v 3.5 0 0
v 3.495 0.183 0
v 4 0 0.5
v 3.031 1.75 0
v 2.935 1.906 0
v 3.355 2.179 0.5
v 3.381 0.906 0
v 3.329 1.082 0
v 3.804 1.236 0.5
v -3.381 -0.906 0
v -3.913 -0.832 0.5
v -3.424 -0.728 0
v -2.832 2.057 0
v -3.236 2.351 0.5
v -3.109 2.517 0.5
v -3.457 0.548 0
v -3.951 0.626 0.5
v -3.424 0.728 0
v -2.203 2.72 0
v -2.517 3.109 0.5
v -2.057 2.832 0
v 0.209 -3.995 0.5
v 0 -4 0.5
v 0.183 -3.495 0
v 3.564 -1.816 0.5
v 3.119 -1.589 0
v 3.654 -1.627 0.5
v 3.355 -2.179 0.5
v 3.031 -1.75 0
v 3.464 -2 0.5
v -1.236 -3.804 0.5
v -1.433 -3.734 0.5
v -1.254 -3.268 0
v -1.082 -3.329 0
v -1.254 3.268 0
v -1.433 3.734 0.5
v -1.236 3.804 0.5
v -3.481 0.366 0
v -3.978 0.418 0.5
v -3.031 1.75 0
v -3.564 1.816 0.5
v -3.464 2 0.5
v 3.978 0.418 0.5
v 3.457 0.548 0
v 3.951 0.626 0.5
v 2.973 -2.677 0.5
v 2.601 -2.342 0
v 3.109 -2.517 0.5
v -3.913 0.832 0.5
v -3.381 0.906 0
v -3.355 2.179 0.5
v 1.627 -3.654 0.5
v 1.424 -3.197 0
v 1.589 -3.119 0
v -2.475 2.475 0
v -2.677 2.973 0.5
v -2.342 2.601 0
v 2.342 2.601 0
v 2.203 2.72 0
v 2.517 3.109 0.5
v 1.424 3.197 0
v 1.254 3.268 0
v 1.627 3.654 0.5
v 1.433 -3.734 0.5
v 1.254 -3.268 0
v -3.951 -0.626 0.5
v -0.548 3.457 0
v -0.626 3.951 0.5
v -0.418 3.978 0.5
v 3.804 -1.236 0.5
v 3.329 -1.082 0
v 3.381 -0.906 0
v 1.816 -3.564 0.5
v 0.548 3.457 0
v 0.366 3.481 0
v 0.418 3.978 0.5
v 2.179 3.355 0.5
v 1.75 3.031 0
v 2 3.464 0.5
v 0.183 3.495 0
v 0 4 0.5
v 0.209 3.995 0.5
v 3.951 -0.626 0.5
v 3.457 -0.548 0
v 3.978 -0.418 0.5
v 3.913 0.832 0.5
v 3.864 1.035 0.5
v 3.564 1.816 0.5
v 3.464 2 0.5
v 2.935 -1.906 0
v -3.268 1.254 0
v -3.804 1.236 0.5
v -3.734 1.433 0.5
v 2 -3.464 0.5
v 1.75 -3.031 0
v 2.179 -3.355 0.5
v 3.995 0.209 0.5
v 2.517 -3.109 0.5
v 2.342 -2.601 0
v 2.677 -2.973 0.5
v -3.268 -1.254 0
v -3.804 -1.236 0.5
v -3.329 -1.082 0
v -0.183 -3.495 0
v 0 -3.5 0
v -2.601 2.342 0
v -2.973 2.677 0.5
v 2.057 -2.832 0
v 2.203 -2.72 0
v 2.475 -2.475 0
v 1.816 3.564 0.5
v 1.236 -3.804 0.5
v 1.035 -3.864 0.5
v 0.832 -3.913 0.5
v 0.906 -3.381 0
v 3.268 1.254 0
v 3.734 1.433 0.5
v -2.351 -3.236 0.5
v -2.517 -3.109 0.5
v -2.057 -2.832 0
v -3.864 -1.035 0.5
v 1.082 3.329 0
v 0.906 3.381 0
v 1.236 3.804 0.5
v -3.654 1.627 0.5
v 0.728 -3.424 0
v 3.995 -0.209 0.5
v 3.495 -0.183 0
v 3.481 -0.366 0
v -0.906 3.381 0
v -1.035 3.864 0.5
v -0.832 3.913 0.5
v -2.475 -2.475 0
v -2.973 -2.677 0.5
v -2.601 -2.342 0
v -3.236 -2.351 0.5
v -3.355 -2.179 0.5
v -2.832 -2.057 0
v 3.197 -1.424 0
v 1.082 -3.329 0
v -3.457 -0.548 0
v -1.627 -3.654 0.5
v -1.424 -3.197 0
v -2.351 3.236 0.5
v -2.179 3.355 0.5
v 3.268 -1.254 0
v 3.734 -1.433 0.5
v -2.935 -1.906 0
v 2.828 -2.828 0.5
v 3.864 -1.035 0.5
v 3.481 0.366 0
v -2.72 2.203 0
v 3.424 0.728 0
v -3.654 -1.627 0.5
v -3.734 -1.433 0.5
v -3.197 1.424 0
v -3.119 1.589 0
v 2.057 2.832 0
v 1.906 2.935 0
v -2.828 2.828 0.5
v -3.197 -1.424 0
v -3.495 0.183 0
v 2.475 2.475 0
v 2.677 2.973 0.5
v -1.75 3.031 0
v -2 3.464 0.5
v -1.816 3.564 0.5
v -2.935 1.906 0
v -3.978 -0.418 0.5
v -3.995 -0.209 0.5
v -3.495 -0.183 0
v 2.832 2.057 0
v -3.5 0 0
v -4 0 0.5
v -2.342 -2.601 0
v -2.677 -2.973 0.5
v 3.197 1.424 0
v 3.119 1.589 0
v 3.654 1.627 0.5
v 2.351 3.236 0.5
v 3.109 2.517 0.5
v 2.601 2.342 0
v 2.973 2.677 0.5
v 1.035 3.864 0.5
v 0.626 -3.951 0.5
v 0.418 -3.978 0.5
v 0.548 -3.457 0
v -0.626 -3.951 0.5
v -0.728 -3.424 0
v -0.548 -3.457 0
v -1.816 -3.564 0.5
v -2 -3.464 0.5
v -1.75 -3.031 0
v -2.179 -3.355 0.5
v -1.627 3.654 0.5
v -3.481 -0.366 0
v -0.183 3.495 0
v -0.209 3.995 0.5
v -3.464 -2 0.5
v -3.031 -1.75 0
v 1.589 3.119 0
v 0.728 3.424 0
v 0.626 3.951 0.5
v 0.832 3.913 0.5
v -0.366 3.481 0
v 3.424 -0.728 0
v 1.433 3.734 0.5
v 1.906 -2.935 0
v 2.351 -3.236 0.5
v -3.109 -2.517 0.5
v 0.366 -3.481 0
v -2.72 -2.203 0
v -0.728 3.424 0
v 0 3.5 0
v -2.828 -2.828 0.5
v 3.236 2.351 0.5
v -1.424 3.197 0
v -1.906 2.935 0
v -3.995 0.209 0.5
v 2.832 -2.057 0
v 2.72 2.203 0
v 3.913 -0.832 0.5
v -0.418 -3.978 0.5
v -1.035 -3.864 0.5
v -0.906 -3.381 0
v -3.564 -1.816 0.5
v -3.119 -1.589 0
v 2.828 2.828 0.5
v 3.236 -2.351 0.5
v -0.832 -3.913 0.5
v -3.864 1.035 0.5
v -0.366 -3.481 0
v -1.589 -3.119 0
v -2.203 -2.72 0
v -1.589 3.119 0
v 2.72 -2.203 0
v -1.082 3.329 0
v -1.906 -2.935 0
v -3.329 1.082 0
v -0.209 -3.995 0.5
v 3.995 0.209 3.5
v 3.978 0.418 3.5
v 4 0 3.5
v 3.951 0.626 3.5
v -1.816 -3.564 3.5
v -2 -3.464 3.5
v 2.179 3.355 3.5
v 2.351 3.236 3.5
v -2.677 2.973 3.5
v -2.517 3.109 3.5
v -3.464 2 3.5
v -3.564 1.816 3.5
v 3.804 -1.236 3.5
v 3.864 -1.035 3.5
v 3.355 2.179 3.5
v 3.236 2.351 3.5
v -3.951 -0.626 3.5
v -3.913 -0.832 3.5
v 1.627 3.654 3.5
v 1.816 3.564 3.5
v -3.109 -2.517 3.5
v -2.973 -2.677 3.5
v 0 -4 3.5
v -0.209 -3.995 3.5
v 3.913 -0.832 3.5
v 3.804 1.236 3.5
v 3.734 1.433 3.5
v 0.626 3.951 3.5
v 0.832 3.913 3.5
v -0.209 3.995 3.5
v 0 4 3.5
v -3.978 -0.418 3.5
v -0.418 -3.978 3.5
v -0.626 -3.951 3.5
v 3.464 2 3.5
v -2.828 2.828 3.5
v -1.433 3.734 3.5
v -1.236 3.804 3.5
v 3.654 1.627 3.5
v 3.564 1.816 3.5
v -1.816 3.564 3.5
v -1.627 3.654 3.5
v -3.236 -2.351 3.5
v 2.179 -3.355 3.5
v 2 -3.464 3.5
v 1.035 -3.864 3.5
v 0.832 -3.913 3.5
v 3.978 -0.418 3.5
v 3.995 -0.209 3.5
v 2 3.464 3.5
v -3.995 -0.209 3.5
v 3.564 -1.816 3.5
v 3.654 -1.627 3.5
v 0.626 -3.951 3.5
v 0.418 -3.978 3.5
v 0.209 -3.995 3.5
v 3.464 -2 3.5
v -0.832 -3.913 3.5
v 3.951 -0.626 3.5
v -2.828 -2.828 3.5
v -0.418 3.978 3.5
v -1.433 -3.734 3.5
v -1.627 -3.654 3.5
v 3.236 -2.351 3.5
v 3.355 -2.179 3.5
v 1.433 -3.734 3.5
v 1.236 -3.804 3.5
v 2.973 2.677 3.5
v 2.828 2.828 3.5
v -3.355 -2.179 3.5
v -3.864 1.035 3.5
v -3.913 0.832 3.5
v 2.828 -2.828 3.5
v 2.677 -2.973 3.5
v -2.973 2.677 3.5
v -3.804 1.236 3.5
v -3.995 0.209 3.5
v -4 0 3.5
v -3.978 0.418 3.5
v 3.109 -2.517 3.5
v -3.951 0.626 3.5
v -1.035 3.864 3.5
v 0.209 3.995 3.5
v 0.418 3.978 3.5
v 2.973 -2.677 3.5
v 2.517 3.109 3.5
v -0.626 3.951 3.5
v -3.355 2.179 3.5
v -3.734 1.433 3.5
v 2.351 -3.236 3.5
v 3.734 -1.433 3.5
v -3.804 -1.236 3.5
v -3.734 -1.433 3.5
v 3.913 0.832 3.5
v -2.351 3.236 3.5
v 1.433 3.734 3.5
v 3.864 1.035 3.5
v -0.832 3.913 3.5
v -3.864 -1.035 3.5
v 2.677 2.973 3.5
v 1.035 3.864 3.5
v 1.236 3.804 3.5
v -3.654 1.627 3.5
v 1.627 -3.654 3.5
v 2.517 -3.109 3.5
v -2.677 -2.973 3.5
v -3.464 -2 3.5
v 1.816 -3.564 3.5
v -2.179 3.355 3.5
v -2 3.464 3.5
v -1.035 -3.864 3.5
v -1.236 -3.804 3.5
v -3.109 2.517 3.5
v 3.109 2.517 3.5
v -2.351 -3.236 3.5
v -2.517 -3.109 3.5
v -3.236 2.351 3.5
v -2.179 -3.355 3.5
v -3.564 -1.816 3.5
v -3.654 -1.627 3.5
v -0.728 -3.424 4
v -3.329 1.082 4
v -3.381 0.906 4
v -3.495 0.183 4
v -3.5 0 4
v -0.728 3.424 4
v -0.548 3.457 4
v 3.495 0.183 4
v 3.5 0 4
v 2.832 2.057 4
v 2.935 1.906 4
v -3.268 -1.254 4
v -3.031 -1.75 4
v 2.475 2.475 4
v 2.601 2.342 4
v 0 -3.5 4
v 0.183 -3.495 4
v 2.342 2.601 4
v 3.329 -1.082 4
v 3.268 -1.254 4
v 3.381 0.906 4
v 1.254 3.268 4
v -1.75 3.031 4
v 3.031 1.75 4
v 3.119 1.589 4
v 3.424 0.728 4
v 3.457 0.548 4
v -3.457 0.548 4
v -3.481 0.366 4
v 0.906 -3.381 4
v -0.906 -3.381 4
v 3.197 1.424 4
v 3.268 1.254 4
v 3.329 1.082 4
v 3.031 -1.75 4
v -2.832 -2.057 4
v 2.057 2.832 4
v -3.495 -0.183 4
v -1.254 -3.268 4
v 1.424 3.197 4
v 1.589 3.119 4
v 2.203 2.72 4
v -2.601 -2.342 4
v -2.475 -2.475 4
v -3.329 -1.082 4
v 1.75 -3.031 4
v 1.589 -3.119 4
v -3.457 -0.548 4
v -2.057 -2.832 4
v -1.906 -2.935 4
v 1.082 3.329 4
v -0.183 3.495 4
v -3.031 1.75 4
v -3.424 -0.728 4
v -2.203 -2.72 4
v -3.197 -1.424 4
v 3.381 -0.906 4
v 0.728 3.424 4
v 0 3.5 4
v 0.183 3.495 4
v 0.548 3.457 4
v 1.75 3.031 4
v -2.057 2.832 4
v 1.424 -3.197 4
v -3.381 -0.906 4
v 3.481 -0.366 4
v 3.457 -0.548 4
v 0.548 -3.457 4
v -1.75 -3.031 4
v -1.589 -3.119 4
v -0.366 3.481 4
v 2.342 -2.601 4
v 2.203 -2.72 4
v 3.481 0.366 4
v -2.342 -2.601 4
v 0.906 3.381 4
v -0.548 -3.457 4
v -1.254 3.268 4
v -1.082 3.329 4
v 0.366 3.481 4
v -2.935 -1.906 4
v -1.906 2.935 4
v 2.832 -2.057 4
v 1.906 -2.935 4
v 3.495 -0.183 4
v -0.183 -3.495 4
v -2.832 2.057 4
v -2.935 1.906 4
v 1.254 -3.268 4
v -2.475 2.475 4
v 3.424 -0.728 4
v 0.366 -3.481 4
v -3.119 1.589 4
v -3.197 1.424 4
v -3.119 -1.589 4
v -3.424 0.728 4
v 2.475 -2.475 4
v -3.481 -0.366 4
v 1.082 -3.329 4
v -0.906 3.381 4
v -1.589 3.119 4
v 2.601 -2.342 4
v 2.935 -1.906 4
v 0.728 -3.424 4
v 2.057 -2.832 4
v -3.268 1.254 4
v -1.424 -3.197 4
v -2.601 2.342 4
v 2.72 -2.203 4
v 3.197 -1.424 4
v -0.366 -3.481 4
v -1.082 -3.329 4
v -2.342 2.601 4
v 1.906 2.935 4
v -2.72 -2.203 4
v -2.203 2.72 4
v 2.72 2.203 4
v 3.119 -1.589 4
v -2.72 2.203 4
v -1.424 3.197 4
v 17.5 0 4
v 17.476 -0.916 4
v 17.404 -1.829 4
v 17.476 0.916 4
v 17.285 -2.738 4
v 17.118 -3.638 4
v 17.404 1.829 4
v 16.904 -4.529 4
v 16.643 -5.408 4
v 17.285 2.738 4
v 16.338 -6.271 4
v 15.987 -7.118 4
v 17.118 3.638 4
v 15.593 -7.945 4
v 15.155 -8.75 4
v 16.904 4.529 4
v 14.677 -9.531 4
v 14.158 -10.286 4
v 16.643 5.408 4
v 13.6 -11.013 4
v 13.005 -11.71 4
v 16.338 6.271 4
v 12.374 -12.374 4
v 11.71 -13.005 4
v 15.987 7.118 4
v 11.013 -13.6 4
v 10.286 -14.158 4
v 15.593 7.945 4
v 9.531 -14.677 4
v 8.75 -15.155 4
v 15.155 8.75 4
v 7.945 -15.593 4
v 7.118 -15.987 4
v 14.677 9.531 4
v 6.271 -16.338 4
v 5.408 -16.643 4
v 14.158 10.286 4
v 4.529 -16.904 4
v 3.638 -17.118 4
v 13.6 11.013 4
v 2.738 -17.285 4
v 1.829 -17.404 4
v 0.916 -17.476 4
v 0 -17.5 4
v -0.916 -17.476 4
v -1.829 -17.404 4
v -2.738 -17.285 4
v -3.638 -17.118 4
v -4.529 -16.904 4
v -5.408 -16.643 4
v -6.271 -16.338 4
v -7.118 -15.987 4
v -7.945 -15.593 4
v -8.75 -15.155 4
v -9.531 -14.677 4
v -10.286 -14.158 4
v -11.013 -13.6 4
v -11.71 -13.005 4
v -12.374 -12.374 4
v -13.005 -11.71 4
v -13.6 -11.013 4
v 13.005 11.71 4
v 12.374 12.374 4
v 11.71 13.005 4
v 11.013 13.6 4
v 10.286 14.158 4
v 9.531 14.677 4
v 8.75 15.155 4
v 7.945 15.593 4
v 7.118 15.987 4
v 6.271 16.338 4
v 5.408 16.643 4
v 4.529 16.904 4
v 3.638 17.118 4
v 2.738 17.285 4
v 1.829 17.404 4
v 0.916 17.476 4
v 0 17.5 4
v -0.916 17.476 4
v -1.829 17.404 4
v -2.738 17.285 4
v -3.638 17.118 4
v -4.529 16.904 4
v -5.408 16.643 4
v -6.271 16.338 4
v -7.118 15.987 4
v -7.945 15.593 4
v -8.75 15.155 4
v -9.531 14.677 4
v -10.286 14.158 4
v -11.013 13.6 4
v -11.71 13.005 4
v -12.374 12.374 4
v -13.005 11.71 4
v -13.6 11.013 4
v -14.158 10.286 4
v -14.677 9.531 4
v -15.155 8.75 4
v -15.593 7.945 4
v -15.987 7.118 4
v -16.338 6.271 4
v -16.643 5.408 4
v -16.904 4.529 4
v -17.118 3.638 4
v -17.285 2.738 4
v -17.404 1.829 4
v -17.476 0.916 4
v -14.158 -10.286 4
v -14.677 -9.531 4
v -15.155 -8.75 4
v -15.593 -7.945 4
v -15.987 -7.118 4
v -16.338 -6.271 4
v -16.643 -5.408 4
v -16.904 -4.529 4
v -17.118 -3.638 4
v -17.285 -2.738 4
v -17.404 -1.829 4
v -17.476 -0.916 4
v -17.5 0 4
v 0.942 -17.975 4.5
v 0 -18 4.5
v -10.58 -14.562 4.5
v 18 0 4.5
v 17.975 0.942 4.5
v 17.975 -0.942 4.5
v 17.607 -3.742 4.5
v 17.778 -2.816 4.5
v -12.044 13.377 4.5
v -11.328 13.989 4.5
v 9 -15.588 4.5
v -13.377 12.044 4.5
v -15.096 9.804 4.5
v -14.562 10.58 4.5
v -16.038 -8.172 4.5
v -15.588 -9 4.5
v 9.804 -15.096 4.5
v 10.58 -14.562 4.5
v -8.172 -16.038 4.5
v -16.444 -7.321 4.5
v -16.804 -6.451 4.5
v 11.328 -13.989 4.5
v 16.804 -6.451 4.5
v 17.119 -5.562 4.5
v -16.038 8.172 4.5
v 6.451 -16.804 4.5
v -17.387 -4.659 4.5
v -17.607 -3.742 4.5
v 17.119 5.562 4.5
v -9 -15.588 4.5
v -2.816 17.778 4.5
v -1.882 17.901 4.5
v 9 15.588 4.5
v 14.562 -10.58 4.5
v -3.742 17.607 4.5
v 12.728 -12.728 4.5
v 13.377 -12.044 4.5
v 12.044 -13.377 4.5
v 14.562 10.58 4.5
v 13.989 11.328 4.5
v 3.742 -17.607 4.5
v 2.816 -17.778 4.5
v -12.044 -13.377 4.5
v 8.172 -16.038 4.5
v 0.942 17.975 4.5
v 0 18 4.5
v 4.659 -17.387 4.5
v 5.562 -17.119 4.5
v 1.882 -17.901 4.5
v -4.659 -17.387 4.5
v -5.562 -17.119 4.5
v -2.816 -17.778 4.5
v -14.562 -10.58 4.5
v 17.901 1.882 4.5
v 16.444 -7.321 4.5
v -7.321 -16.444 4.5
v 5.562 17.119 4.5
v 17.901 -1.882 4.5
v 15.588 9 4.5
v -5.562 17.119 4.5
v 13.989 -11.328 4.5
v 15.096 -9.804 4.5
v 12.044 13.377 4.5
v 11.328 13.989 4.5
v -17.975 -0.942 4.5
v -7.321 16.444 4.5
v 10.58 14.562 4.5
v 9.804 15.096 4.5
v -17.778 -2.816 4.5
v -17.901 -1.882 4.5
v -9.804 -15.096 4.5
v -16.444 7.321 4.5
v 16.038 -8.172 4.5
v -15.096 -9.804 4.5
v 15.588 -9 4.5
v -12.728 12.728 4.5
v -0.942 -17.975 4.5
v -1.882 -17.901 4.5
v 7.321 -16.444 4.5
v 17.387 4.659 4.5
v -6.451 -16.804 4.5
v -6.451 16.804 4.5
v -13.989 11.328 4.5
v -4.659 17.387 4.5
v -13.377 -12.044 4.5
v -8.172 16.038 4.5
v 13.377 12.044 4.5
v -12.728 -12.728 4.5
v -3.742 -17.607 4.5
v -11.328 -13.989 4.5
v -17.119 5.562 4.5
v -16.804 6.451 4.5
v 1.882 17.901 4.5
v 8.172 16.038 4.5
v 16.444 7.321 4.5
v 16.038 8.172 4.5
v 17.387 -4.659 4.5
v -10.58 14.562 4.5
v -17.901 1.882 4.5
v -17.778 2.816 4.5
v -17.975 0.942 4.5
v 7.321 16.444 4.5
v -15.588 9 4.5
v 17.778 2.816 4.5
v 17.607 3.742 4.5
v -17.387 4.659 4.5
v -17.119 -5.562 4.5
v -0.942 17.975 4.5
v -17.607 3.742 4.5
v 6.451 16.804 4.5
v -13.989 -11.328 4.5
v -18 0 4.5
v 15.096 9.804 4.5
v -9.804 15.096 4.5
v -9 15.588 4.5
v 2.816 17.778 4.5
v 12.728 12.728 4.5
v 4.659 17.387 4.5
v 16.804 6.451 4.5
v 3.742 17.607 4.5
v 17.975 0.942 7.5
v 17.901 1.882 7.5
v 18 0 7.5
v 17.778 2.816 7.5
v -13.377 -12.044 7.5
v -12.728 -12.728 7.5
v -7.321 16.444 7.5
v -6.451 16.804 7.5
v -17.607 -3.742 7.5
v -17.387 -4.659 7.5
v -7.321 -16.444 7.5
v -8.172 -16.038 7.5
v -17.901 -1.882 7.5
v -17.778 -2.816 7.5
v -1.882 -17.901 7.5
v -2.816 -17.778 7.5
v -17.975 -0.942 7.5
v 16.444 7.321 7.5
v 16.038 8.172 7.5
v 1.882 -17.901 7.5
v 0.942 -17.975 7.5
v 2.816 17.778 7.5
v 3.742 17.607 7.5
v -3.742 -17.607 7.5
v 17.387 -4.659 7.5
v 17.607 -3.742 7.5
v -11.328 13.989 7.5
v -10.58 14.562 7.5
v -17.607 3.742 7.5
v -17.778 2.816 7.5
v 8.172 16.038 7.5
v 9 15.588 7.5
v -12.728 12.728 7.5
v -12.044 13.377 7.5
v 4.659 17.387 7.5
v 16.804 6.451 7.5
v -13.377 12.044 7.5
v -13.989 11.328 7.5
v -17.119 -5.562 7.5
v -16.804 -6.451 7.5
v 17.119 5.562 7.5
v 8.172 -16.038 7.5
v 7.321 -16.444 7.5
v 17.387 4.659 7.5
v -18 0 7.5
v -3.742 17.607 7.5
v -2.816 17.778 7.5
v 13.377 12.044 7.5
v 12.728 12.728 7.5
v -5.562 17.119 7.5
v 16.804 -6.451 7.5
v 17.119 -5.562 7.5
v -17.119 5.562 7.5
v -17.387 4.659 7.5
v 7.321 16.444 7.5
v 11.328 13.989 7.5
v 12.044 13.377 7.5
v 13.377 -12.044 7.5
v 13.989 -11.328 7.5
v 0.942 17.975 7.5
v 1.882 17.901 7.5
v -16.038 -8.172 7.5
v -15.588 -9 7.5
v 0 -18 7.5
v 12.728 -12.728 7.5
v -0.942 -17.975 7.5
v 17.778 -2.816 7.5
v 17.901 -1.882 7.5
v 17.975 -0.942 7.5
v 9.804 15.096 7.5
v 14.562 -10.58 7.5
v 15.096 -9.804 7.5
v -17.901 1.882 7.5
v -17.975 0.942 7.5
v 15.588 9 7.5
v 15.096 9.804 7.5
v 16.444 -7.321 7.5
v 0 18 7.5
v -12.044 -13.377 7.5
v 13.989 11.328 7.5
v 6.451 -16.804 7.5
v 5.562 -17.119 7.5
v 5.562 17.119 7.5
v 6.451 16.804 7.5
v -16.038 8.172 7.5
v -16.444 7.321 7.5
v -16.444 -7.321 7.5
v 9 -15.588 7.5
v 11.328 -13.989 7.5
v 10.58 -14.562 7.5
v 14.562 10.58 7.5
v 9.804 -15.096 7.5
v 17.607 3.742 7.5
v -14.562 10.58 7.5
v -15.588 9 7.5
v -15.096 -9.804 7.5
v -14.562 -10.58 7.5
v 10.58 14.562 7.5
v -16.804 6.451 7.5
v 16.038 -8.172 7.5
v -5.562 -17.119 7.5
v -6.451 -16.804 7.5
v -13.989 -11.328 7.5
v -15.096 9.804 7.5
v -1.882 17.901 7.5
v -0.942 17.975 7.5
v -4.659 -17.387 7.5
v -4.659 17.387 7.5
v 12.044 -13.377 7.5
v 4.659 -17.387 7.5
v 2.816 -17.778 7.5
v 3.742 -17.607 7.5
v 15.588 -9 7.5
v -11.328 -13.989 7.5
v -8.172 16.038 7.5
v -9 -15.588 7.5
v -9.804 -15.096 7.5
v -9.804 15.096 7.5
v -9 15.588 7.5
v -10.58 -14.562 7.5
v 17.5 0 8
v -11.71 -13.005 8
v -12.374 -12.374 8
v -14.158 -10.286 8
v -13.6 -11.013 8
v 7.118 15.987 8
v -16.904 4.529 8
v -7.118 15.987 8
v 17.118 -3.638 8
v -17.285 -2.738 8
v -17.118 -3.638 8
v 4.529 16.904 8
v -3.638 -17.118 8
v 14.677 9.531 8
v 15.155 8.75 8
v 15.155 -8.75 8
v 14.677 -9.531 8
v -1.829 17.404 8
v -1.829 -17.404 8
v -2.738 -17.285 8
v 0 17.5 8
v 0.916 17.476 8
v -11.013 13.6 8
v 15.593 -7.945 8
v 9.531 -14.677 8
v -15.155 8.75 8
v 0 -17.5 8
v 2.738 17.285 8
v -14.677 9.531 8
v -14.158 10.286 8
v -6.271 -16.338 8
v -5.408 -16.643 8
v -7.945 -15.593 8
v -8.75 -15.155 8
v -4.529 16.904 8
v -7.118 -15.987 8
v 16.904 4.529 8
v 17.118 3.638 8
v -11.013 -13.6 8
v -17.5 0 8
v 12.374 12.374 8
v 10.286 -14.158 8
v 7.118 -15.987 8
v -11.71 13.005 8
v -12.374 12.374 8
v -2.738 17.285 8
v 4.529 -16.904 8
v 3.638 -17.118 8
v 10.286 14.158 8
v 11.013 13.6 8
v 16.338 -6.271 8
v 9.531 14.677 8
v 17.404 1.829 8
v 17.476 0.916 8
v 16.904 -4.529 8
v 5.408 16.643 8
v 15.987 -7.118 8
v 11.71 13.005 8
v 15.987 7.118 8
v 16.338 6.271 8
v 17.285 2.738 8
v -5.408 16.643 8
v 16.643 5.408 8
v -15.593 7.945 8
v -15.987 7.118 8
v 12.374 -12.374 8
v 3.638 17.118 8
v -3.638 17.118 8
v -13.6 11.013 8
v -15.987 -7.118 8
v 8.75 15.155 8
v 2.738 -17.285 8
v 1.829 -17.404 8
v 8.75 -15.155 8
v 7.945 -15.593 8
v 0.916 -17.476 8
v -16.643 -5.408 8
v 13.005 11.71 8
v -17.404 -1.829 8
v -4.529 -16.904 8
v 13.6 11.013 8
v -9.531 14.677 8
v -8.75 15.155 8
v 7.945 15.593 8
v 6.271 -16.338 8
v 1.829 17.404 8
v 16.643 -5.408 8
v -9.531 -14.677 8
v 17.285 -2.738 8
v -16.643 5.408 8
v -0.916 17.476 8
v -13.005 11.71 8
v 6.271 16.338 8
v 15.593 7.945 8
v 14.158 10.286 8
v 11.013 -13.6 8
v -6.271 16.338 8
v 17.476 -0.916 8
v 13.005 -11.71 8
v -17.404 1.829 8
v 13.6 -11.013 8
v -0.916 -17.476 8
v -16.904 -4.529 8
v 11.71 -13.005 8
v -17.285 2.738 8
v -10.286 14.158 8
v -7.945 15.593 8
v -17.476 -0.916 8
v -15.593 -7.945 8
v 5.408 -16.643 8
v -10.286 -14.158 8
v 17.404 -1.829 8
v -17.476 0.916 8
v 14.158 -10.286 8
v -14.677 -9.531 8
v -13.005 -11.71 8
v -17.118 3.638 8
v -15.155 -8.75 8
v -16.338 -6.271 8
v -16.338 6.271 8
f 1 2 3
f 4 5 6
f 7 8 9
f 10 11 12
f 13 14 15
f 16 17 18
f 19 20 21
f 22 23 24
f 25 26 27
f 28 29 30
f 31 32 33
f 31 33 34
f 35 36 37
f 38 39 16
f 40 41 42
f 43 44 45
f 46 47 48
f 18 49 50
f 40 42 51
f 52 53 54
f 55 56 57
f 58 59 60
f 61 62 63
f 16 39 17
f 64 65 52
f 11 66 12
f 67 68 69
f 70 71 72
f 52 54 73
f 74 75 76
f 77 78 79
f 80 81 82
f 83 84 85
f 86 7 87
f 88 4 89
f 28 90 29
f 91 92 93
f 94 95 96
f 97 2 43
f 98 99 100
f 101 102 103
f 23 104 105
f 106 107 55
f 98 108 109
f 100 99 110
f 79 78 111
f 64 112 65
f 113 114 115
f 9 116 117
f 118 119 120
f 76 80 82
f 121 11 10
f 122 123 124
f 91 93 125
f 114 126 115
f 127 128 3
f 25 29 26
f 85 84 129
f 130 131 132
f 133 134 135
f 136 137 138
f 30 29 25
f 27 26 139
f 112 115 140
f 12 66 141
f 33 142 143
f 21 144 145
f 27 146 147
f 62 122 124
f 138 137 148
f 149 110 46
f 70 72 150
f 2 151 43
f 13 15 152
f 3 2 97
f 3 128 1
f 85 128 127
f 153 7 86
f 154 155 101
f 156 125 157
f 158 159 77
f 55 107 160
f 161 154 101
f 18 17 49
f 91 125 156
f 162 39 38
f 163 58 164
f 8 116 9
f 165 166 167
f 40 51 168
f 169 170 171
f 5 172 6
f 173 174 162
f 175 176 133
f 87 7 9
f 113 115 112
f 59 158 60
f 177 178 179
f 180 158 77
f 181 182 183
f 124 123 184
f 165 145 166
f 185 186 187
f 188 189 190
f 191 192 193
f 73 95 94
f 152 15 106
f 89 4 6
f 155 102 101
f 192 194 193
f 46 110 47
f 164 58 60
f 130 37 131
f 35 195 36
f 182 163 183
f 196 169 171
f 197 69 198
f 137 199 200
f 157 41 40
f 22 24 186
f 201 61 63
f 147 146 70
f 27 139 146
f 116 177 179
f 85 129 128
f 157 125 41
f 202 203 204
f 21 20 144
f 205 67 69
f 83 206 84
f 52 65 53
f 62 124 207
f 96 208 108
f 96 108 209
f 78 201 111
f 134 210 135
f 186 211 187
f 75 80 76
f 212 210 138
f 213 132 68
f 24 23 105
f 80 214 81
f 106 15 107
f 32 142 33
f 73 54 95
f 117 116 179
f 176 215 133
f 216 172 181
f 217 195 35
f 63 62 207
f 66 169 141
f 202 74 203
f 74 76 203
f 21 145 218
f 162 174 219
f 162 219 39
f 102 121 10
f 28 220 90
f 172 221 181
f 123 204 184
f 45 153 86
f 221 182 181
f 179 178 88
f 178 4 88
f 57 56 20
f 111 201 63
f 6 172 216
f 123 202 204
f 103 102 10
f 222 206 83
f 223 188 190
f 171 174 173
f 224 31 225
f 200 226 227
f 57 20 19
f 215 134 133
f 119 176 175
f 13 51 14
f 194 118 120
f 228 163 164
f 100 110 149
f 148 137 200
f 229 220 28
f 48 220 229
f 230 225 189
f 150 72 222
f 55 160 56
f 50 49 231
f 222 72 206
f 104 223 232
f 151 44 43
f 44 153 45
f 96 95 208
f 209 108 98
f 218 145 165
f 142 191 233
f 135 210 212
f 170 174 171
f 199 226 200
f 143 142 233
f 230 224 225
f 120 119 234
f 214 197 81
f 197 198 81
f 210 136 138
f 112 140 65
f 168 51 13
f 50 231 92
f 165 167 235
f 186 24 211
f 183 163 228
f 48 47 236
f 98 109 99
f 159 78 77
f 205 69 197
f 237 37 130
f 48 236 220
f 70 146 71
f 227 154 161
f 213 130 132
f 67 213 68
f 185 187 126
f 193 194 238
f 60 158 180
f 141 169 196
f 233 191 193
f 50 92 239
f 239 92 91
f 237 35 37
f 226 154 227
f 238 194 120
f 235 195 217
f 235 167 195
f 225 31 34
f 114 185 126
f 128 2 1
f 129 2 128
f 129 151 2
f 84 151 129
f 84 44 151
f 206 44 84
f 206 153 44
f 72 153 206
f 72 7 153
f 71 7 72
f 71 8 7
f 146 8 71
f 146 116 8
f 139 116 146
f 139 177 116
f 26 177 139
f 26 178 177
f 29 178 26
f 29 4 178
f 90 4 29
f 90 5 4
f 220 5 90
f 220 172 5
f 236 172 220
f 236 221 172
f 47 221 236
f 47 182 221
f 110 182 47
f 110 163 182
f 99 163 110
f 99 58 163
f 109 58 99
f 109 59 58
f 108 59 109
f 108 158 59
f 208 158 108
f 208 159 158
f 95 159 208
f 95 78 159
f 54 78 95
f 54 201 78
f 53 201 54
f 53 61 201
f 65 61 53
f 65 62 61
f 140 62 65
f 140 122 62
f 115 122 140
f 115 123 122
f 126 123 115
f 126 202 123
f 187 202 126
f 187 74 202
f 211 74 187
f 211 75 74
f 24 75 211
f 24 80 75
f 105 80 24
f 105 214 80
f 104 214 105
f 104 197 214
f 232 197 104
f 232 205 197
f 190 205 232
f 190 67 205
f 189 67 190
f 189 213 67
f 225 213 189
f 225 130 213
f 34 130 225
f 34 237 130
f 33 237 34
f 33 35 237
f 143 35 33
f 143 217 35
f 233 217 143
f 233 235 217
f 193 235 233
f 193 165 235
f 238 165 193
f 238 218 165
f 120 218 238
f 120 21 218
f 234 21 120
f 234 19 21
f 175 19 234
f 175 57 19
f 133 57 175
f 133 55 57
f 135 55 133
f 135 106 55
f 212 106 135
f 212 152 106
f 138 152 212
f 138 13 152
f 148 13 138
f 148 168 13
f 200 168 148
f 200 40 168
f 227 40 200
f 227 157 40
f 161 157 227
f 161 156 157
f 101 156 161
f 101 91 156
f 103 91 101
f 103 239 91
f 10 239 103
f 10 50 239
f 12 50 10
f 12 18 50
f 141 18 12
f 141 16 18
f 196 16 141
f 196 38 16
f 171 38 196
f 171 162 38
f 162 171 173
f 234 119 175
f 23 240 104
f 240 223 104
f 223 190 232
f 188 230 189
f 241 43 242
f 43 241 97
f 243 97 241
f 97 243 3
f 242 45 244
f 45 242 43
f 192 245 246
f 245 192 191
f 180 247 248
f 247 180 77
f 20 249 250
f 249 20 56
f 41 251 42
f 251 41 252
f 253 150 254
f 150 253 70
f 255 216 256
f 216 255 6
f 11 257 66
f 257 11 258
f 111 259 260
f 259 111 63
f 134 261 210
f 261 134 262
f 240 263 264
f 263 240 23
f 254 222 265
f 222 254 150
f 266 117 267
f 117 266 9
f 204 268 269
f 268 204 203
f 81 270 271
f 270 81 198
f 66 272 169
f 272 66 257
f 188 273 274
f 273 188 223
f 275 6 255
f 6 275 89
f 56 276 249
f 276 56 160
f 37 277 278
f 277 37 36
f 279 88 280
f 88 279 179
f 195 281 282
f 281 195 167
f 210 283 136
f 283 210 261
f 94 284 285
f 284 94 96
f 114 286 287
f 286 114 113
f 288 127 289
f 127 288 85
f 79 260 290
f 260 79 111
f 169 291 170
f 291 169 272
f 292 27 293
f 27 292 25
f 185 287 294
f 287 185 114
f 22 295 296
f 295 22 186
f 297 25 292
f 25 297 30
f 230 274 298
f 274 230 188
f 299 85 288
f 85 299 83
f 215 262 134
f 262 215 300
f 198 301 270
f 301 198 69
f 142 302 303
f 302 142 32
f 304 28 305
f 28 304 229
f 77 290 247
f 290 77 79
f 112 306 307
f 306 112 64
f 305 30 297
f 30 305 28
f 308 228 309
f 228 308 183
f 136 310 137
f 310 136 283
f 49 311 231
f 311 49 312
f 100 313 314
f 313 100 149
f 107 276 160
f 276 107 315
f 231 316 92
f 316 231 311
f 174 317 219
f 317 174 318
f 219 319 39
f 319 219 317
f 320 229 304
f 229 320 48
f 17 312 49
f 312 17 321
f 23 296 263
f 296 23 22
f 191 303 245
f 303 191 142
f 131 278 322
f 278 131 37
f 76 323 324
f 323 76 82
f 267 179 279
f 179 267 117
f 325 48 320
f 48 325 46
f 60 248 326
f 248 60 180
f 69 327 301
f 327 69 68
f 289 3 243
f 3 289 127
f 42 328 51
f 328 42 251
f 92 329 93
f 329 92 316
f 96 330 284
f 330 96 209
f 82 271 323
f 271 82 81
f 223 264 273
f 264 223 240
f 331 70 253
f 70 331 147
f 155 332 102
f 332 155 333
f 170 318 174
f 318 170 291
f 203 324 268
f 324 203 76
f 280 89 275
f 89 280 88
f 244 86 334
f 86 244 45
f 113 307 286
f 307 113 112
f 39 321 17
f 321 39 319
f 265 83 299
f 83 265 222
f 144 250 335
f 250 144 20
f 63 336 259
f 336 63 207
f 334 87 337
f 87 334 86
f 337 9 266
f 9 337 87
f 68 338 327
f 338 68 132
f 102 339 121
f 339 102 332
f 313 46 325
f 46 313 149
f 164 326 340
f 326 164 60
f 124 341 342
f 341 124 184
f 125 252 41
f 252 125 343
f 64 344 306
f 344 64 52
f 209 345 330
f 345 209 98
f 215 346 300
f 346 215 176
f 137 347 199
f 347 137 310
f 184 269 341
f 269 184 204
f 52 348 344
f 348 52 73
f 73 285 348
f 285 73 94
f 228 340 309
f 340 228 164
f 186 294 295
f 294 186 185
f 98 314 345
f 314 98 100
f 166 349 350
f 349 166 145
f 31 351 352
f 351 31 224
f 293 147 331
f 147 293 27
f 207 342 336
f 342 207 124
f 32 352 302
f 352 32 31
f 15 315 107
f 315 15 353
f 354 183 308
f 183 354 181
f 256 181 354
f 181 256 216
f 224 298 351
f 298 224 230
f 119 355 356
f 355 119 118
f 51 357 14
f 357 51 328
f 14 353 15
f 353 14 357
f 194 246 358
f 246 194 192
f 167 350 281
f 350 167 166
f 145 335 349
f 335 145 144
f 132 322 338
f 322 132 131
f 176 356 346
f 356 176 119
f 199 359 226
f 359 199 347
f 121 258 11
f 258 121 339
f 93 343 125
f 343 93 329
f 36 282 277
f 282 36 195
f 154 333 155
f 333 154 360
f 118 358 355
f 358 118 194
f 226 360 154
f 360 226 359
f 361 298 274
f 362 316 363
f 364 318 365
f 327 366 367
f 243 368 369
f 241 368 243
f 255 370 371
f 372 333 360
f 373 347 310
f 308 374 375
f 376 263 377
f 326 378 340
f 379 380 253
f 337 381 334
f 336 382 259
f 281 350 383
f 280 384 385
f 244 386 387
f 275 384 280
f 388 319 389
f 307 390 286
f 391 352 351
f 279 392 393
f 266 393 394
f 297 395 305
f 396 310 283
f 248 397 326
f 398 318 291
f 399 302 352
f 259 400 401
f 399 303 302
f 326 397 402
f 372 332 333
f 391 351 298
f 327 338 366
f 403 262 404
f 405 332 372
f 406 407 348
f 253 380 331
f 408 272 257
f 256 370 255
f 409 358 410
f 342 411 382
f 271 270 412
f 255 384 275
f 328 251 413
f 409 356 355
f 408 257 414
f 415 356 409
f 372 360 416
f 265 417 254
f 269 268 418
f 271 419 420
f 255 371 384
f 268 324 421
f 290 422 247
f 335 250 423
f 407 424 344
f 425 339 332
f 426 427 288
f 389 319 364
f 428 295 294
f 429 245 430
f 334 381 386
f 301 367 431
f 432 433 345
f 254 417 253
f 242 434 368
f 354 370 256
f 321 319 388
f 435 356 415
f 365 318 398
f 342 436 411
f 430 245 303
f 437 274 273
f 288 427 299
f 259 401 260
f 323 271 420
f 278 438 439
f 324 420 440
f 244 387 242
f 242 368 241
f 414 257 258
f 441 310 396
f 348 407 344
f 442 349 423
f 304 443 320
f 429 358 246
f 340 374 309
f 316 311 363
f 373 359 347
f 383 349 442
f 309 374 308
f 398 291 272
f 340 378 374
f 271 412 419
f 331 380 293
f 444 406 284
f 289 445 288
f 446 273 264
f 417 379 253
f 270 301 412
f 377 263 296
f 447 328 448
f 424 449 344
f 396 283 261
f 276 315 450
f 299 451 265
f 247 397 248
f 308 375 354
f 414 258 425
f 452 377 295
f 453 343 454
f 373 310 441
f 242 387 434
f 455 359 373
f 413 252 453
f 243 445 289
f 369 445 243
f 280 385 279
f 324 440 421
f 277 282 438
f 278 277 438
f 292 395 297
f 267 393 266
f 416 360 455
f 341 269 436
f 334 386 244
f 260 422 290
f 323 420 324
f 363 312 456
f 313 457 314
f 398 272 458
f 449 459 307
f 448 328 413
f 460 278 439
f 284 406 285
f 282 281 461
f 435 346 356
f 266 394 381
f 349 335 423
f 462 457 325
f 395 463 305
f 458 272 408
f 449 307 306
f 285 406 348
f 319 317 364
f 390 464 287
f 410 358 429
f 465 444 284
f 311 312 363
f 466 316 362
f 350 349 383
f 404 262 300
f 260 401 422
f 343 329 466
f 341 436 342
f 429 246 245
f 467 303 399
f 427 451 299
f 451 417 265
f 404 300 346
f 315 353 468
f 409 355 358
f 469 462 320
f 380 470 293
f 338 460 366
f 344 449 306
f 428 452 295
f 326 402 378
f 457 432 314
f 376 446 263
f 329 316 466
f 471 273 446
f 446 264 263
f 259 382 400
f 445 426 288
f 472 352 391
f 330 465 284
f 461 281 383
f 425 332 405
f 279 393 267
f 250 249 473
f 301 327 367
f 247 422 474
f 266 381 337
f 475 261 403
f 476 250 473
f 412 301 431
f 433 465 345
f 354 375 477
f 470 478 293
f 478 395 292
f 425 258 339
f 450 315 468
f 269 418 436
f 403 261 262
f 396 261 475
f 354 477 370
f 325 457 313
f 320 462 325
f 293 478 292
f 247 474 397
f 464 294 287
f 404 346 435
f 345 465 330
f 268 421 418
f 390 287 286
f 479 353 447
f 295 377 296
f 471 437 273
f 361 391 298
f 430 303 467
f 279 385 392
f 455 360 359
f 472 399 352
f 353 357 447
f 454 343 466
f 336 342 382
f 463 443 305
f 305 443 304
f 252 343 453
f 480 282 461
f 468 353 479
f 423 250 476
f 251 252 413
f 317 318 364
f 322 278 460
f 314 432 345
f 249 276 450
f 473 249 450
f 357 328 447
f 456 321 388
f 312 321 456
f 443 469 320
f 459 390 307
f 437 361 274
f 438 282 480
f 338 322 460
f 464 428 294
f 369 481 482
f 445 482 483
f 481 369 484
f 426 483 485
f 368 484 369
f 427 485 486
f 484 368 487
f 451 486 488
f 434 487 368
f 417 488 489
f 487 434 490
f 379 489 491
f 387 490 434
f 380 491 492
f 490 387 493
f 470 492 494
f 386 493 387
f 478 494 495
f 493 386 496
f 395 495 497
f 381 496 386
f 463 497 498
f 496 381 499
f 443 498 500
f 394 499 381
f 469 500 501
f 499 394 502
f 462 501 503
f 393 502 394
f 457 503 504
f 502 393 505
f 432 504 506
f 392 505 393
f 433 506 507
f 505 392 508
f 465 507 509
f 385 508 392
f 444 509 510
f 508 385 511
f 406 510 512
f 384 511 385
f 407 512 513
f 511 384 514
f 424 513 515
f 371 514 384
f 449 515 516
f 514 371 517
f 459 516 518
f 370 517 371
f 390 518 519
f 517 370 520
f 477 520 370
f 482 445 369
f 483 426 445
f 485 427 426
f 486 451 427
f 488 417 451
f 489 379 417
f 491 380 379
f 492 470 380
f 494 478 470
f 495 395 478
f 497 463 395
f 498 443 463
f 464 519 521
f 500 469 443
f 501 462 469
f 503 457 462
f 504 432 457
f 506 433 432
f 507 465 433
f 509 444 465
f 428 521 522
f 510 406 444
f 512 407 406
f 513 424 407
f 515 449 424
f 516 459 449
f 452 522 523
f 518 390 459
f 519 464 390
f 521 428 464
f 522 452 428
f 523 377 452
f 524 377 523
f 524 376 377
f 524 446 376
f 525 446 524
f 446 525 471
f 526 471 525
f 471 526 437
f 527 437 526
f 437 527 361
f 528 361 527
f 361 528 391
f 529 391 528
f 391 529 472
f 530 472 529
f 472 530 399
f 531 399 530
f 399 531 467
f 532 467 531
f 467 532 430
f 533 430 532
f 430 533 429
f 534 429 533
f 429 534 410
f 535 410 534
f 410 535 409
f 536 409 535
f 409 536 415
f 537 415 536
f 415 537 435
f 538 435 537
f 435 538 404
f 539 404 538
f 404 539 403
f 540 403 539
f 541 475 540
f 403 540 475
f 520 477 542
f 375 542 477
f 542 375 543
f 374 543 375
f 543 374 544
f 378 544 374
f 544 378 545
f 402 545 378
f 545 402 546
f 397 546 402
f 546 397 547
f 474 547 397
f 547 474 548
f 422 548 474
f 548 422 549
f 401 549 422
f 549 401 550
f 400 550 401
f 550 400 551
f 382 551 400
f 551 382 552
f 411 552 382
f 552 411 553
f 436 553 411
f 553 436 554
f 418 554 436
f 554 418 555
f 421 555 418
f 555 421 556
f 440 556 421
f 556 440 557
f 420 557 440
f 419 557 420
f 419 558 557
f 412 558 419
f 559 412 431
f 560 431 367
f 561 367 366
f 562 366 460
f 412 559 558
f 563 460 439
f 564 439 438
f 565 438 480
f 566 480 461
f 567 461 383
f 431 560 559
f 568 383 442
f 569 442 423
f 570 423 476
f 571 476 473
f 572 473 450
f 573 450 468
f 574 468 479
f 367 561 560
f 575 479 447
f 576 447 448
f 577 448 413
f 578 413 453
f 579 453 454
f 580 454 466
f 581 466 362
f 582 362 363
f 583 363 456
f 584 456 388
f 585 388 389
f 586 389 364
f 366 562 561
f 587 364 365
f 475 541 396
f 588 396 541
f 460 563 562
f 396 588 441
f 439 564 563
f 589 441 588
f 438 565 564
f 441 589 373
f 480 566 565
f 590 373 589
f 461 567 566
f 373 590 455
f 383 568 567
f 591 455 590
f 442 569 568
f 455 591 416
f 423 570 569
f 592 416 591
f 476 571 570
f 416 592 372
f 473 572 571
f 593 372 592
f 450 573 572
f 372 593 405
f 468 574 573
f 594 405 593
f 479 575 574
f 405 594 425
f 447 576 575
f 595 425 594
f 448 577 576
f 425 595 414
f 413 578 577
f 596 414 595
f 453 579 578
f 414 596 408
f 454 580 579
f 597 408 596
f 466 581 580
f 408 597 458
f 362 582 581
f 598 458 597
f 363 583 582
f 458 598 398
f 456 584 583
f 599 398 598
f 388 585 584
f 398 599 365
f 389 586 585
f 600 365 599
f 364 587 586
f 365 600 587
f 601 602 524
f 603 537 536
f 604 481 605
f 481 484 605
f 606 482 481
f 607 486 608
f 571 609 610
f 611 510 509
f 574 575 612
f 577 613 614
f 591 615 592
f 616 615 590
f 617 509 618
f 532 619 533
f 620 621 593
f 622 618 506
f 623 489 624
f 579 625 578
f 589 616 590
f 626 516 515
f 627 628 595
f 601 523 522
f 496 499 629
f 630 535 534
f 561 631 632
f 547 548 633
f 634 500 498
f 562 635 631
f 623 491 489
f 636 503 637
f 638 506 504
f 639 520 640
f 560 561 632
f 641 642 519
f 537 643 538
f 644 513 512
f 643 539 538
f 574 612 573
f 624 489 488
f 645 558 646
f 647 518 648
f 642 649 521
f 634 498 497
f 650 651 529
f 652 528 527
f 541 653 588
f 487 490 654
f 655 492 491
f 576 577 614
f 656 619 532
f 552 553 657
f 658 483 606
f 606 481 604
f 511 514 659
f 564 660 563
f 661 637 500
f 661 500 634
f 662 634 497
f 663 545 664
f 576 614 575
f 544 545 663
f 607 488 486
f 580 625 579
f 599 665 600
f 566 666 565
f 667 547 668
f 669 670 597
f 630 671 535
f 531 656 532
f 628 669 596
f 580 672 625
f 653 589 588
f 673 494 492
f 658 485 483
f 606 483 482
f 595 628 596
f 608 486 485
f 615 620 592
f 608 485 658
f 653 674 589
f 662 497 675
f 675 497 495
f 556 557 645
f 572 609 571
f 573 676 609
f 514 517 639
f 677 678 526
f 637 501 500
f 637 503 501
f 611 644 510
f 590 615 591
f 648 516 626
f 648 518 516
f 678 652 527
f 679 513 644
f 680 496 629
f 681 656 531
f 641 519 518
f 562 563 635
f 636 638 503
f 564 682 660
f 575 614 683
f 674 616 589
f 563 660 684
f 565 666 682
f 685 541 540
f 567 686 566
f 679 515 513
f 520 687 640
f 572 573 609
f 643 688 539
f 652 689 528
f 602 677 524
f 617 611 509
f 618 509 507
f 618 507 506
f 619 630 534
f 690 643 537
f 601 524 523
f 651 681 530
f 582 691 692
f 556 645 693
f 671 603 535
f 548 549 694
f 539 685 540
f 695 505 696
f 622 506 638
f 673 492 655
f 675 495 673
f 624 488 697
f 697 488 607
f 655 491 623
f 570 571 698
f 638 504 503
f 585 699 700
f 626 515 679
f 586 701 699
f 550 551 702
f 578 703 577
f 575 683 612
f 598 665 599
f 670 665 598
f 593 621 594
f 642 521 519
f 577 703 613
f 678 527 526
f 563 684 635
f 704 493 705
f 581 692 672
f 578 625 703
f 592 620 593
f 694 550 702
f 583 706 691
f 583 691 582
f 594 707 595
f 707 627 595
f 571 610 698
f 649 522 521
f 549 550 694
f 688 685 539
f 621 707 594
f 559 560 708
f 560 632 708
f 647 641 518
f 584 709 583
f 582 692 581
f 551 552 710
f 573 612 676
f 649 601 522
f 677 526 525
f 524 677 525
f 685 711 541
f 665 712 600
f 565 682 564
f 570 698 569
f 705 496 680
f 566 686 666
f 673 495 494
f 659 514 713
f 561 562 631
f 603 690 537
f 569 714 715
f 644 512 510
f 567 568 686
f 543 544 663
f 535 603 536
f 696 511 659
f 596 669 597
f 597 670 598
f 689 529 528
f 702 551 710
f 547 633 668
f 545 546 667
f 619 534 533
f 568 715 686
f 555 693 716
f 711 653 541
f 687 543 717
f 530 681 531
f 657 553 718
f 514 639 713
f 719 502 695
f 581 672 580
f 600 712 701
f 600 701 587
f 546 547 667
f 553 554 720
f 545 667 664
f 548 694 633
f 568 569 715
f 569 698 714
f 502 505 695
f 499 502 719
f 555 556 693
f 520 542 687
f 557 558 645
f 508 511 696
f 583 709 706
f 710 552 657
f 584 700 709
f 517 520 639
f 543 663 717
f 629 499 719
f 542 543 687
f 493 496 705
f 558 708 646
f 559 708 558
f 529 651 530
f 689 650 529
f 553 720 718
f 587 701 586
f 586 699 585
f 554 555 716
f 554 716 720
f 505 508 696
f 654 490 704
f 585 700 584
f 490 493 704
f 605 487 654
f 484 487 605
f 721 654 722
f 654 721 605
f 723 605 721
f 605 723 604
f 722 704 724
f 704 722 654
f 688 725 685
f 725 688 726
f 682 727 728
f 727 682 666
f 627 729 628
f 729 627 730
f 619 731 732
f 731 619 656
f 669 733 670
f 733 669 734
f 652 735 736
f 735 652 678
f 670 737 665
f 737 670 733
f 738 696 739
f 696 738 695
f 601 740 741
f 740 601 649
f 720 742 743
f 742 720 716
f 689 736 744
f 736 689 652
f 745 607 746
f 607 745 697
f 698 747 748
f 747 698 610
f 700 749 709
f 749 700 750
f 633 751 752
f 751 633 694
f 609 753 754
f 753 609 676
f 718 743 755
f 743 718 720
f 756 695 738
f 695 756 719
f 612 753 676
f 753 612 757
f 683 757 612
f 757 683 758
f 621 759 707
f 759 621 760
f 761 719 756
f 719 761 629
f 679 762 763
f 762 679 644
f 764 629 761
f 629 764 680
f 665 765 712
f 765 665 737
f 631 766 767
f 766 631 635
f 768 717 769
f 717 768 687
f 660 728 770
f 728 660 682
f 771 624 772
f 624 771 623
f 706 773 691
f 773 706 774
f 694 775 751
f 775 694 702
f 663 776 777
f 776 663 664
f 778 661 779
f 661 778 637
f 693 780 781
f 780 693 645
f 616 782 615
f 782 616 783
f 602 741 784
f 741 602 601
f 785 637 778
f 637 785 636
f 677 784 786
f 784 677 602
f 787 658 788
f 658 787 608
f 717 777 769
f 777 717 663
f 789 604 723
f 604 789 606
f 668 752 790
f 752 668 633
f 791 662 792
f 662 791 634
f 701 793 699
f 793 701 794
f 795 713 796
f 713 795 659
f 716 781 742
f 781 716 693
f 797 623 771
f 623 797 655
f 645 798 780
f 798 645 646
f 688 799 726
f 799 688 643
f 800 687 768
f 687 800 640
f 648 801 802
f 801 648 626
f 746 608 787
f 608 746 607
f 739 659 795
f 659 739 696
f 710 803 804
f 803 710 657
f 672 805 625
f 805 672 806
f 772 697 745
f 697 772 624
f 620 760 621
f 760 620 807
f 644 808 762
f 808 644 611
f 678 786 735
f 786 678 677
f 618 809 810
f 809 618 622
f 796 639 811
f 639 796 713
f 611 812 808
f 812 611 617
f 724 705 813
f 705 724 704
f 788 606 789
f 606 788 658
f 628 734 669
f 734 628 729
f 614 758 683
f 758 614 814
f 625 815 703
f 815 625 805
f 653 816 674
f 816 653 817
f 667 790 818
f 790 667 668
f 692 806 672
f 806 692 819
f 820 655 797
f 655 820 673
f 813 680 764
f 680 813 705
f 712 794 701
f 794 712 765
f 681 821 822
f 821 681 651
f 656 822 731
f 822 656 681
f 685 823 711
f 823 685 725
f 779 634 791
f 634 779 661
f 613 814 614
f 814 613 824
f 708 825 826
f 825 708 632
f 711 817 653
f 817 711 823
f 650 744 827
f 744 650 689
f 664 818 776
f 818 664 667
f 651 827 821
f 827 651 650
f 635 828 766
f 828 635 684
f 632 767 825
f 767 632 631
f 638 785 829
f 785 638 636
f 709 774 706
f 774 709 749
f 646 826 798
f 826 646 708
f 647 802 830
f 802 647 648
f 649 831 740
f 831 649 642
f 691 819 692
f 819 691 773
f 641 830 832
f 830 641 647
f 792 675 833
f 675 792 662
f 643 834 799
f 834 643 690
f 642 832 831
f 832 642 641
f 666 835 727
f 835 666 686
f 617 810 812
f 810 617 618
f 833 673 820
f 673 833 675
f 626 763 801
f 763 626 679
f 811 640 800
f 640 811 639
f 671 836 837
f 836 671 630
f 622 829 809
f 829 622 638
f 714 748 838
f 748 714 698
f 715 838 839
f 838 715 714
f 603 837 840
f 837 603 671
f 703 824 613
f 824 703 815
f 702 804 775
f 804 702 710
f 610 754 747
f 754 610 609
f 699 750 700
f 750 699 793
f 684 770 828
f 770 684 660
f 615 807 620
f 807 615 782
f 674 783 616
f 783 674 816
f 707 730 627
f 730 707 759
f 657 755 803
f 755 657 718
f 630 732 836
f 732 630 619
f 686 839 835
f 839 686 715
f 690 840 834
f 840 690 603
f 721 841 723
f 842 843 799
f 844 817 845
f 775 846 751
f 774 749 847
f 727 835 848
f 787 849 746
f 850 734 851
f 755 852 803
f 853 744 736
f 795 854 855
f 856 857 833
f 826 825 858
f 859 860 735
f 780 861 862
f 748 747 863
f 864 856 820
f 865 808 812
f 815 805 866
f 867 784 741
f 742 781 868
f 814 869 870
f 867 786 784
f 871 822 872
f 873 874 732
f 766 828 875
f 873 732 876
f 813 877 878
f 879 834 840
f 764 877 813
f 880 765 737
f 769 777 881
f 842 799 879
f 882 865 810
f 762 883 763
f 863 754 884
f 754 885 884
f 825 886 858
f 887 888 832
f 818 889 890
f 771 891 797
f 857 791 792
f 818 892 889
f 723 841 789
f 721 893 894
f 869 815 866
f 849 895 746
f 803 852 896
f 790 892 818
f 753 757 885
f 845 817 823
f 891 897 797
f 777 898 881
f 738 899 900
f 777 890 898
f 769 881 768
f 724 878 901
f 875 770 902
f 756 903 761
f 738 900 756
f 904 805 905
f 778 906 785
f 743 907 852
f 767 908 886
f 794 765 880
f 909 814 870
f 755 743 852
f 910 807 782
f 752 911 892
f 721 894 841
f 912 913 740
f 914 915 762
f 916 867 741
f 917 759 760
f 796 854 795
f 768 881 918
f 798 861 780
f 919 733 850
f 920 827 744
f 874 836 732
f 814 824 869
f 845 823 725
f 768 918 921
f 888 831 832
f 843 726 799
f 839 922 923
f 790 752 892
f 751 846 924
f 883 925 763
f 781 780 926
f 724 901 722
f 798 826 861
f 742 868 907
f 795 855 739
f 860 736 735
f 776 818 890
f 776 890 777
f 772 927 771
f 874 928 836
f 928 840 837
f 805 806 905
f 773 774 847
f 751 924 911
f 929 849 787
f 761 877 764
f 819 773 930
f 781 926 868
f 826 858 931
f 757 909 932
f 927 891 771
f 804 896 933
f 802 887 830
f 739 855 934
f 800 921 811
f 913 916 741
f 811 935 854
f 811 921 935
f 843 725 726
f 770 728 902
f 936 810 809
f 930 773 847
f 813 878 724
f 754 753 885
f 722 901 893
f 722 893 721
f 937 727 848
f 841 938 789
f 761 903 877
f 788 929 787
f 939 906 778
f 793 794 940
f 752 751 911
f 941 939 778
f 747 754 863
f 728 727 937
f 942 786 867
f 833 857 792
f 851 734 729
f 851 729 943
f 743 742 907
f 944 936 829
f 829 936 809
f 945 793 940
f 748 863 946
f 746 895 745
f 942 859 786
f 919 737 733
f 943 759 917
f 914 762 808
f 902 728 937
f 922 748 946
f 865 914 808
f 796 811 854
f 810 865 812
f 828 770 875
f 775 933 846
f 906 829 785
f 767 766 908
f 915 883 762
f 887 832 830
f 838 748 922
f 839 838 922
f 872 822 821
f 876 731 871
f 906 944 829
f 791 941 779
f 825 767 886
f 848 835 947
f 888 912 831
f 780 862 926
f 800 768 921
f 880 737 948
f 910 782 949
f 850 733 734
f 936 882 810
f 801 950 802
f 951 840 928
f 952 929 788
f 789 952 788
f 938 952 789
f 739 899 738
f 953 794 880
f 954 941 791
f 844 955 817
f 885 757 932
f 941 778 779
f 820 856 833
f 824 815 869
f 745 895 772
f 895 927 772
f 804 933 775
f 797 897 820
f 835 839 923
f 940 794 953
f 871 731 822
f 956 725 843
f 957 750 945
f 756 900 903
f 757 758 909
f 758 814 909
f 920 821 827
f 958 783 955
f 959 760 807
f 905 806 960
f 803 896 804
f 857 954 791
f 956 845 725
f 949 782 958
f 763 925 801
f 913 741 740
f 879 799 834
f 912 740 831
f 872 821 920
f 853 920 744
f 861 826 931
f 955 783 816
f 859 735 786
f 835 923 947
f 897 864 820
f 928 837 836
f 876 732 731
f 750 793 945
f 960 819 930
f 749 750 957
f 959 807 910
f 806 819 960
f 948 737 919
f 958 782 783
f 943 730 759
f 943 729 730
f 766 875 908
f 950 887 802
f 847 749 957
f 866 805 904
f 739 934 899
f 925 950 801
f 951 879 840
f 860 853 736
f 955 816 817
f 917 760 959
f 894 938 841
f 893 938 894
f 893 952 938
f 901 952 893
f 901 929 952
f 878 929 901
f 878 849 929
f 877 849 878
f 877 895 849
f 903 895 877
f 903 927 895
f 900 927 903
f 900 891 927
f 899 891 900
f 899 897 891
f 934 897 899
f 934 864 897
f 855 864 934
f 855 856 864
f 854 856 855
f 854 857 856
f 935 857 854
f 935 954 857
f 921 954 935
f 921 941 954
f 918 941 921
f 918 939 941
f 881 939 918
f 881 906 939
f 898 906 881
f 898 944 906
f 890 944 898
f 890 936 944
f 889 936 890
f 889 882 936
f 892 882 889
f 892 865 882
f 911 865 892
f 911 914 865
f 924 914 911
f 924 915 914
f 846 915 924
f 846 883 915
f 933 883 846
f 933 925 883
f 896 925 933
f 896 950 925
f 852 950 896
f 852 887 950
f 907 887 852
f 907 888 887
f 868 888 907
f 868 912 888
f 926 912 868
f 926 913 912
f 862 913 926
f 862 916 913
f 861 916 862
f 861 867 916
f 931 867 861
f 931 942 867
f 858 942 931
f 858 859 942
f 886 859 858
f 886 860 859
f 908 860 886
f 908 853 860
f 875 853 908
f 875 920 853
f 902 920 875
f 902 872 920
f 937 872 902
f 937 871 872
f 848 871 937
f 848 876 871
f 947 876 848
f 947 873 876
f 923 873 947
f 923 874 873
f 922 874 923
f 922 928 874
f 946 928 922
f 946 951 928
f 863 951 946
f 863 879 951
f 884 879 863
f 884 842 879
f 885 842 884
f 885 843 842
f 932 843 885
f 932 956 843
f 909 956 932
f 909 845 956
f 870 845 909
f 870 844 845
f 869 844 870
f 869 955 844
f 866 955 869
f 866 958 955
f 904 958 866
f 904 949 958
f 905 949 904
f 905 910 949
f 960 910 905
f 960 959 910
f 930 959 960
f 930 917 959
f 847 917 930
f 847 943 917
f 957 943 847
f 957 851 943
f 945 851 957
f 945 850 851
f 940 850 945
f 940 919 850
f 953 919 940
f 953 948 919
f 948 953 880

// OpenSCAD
// Parametric load-transfer puck for tactile-skin weight calibration.
// Print upright with the small foot on the build plate.

$fn = 120;

foot_diameter = 8.0;
foot_height = 4.0;
top_diameter = 36.0;
top_height = 4.0;
edge_chamfer = 0.5;

module chamfered_cylinder(diameter, height, chamfer) {
    cylinder(d1=diameter - 2 * chamfer, d2=diameter, h=chamfer);
    translate([0, 0, chamfer])
        cylinder(d=diameter, h=height - 2 * chamfer);
    translate([0, 0, height - chamfer])
        cylinder(d1=diameter, d2=diameter - 2 * chamfer, h=chamfer);
}

union() {
    chamfered_cylinder(foot_diameter, foot_height, edge_chamfer);
    translate([0, 0, foot_height])
        chamfered_cylinder(top_diameter, top_height, edge_chamfer);
}
